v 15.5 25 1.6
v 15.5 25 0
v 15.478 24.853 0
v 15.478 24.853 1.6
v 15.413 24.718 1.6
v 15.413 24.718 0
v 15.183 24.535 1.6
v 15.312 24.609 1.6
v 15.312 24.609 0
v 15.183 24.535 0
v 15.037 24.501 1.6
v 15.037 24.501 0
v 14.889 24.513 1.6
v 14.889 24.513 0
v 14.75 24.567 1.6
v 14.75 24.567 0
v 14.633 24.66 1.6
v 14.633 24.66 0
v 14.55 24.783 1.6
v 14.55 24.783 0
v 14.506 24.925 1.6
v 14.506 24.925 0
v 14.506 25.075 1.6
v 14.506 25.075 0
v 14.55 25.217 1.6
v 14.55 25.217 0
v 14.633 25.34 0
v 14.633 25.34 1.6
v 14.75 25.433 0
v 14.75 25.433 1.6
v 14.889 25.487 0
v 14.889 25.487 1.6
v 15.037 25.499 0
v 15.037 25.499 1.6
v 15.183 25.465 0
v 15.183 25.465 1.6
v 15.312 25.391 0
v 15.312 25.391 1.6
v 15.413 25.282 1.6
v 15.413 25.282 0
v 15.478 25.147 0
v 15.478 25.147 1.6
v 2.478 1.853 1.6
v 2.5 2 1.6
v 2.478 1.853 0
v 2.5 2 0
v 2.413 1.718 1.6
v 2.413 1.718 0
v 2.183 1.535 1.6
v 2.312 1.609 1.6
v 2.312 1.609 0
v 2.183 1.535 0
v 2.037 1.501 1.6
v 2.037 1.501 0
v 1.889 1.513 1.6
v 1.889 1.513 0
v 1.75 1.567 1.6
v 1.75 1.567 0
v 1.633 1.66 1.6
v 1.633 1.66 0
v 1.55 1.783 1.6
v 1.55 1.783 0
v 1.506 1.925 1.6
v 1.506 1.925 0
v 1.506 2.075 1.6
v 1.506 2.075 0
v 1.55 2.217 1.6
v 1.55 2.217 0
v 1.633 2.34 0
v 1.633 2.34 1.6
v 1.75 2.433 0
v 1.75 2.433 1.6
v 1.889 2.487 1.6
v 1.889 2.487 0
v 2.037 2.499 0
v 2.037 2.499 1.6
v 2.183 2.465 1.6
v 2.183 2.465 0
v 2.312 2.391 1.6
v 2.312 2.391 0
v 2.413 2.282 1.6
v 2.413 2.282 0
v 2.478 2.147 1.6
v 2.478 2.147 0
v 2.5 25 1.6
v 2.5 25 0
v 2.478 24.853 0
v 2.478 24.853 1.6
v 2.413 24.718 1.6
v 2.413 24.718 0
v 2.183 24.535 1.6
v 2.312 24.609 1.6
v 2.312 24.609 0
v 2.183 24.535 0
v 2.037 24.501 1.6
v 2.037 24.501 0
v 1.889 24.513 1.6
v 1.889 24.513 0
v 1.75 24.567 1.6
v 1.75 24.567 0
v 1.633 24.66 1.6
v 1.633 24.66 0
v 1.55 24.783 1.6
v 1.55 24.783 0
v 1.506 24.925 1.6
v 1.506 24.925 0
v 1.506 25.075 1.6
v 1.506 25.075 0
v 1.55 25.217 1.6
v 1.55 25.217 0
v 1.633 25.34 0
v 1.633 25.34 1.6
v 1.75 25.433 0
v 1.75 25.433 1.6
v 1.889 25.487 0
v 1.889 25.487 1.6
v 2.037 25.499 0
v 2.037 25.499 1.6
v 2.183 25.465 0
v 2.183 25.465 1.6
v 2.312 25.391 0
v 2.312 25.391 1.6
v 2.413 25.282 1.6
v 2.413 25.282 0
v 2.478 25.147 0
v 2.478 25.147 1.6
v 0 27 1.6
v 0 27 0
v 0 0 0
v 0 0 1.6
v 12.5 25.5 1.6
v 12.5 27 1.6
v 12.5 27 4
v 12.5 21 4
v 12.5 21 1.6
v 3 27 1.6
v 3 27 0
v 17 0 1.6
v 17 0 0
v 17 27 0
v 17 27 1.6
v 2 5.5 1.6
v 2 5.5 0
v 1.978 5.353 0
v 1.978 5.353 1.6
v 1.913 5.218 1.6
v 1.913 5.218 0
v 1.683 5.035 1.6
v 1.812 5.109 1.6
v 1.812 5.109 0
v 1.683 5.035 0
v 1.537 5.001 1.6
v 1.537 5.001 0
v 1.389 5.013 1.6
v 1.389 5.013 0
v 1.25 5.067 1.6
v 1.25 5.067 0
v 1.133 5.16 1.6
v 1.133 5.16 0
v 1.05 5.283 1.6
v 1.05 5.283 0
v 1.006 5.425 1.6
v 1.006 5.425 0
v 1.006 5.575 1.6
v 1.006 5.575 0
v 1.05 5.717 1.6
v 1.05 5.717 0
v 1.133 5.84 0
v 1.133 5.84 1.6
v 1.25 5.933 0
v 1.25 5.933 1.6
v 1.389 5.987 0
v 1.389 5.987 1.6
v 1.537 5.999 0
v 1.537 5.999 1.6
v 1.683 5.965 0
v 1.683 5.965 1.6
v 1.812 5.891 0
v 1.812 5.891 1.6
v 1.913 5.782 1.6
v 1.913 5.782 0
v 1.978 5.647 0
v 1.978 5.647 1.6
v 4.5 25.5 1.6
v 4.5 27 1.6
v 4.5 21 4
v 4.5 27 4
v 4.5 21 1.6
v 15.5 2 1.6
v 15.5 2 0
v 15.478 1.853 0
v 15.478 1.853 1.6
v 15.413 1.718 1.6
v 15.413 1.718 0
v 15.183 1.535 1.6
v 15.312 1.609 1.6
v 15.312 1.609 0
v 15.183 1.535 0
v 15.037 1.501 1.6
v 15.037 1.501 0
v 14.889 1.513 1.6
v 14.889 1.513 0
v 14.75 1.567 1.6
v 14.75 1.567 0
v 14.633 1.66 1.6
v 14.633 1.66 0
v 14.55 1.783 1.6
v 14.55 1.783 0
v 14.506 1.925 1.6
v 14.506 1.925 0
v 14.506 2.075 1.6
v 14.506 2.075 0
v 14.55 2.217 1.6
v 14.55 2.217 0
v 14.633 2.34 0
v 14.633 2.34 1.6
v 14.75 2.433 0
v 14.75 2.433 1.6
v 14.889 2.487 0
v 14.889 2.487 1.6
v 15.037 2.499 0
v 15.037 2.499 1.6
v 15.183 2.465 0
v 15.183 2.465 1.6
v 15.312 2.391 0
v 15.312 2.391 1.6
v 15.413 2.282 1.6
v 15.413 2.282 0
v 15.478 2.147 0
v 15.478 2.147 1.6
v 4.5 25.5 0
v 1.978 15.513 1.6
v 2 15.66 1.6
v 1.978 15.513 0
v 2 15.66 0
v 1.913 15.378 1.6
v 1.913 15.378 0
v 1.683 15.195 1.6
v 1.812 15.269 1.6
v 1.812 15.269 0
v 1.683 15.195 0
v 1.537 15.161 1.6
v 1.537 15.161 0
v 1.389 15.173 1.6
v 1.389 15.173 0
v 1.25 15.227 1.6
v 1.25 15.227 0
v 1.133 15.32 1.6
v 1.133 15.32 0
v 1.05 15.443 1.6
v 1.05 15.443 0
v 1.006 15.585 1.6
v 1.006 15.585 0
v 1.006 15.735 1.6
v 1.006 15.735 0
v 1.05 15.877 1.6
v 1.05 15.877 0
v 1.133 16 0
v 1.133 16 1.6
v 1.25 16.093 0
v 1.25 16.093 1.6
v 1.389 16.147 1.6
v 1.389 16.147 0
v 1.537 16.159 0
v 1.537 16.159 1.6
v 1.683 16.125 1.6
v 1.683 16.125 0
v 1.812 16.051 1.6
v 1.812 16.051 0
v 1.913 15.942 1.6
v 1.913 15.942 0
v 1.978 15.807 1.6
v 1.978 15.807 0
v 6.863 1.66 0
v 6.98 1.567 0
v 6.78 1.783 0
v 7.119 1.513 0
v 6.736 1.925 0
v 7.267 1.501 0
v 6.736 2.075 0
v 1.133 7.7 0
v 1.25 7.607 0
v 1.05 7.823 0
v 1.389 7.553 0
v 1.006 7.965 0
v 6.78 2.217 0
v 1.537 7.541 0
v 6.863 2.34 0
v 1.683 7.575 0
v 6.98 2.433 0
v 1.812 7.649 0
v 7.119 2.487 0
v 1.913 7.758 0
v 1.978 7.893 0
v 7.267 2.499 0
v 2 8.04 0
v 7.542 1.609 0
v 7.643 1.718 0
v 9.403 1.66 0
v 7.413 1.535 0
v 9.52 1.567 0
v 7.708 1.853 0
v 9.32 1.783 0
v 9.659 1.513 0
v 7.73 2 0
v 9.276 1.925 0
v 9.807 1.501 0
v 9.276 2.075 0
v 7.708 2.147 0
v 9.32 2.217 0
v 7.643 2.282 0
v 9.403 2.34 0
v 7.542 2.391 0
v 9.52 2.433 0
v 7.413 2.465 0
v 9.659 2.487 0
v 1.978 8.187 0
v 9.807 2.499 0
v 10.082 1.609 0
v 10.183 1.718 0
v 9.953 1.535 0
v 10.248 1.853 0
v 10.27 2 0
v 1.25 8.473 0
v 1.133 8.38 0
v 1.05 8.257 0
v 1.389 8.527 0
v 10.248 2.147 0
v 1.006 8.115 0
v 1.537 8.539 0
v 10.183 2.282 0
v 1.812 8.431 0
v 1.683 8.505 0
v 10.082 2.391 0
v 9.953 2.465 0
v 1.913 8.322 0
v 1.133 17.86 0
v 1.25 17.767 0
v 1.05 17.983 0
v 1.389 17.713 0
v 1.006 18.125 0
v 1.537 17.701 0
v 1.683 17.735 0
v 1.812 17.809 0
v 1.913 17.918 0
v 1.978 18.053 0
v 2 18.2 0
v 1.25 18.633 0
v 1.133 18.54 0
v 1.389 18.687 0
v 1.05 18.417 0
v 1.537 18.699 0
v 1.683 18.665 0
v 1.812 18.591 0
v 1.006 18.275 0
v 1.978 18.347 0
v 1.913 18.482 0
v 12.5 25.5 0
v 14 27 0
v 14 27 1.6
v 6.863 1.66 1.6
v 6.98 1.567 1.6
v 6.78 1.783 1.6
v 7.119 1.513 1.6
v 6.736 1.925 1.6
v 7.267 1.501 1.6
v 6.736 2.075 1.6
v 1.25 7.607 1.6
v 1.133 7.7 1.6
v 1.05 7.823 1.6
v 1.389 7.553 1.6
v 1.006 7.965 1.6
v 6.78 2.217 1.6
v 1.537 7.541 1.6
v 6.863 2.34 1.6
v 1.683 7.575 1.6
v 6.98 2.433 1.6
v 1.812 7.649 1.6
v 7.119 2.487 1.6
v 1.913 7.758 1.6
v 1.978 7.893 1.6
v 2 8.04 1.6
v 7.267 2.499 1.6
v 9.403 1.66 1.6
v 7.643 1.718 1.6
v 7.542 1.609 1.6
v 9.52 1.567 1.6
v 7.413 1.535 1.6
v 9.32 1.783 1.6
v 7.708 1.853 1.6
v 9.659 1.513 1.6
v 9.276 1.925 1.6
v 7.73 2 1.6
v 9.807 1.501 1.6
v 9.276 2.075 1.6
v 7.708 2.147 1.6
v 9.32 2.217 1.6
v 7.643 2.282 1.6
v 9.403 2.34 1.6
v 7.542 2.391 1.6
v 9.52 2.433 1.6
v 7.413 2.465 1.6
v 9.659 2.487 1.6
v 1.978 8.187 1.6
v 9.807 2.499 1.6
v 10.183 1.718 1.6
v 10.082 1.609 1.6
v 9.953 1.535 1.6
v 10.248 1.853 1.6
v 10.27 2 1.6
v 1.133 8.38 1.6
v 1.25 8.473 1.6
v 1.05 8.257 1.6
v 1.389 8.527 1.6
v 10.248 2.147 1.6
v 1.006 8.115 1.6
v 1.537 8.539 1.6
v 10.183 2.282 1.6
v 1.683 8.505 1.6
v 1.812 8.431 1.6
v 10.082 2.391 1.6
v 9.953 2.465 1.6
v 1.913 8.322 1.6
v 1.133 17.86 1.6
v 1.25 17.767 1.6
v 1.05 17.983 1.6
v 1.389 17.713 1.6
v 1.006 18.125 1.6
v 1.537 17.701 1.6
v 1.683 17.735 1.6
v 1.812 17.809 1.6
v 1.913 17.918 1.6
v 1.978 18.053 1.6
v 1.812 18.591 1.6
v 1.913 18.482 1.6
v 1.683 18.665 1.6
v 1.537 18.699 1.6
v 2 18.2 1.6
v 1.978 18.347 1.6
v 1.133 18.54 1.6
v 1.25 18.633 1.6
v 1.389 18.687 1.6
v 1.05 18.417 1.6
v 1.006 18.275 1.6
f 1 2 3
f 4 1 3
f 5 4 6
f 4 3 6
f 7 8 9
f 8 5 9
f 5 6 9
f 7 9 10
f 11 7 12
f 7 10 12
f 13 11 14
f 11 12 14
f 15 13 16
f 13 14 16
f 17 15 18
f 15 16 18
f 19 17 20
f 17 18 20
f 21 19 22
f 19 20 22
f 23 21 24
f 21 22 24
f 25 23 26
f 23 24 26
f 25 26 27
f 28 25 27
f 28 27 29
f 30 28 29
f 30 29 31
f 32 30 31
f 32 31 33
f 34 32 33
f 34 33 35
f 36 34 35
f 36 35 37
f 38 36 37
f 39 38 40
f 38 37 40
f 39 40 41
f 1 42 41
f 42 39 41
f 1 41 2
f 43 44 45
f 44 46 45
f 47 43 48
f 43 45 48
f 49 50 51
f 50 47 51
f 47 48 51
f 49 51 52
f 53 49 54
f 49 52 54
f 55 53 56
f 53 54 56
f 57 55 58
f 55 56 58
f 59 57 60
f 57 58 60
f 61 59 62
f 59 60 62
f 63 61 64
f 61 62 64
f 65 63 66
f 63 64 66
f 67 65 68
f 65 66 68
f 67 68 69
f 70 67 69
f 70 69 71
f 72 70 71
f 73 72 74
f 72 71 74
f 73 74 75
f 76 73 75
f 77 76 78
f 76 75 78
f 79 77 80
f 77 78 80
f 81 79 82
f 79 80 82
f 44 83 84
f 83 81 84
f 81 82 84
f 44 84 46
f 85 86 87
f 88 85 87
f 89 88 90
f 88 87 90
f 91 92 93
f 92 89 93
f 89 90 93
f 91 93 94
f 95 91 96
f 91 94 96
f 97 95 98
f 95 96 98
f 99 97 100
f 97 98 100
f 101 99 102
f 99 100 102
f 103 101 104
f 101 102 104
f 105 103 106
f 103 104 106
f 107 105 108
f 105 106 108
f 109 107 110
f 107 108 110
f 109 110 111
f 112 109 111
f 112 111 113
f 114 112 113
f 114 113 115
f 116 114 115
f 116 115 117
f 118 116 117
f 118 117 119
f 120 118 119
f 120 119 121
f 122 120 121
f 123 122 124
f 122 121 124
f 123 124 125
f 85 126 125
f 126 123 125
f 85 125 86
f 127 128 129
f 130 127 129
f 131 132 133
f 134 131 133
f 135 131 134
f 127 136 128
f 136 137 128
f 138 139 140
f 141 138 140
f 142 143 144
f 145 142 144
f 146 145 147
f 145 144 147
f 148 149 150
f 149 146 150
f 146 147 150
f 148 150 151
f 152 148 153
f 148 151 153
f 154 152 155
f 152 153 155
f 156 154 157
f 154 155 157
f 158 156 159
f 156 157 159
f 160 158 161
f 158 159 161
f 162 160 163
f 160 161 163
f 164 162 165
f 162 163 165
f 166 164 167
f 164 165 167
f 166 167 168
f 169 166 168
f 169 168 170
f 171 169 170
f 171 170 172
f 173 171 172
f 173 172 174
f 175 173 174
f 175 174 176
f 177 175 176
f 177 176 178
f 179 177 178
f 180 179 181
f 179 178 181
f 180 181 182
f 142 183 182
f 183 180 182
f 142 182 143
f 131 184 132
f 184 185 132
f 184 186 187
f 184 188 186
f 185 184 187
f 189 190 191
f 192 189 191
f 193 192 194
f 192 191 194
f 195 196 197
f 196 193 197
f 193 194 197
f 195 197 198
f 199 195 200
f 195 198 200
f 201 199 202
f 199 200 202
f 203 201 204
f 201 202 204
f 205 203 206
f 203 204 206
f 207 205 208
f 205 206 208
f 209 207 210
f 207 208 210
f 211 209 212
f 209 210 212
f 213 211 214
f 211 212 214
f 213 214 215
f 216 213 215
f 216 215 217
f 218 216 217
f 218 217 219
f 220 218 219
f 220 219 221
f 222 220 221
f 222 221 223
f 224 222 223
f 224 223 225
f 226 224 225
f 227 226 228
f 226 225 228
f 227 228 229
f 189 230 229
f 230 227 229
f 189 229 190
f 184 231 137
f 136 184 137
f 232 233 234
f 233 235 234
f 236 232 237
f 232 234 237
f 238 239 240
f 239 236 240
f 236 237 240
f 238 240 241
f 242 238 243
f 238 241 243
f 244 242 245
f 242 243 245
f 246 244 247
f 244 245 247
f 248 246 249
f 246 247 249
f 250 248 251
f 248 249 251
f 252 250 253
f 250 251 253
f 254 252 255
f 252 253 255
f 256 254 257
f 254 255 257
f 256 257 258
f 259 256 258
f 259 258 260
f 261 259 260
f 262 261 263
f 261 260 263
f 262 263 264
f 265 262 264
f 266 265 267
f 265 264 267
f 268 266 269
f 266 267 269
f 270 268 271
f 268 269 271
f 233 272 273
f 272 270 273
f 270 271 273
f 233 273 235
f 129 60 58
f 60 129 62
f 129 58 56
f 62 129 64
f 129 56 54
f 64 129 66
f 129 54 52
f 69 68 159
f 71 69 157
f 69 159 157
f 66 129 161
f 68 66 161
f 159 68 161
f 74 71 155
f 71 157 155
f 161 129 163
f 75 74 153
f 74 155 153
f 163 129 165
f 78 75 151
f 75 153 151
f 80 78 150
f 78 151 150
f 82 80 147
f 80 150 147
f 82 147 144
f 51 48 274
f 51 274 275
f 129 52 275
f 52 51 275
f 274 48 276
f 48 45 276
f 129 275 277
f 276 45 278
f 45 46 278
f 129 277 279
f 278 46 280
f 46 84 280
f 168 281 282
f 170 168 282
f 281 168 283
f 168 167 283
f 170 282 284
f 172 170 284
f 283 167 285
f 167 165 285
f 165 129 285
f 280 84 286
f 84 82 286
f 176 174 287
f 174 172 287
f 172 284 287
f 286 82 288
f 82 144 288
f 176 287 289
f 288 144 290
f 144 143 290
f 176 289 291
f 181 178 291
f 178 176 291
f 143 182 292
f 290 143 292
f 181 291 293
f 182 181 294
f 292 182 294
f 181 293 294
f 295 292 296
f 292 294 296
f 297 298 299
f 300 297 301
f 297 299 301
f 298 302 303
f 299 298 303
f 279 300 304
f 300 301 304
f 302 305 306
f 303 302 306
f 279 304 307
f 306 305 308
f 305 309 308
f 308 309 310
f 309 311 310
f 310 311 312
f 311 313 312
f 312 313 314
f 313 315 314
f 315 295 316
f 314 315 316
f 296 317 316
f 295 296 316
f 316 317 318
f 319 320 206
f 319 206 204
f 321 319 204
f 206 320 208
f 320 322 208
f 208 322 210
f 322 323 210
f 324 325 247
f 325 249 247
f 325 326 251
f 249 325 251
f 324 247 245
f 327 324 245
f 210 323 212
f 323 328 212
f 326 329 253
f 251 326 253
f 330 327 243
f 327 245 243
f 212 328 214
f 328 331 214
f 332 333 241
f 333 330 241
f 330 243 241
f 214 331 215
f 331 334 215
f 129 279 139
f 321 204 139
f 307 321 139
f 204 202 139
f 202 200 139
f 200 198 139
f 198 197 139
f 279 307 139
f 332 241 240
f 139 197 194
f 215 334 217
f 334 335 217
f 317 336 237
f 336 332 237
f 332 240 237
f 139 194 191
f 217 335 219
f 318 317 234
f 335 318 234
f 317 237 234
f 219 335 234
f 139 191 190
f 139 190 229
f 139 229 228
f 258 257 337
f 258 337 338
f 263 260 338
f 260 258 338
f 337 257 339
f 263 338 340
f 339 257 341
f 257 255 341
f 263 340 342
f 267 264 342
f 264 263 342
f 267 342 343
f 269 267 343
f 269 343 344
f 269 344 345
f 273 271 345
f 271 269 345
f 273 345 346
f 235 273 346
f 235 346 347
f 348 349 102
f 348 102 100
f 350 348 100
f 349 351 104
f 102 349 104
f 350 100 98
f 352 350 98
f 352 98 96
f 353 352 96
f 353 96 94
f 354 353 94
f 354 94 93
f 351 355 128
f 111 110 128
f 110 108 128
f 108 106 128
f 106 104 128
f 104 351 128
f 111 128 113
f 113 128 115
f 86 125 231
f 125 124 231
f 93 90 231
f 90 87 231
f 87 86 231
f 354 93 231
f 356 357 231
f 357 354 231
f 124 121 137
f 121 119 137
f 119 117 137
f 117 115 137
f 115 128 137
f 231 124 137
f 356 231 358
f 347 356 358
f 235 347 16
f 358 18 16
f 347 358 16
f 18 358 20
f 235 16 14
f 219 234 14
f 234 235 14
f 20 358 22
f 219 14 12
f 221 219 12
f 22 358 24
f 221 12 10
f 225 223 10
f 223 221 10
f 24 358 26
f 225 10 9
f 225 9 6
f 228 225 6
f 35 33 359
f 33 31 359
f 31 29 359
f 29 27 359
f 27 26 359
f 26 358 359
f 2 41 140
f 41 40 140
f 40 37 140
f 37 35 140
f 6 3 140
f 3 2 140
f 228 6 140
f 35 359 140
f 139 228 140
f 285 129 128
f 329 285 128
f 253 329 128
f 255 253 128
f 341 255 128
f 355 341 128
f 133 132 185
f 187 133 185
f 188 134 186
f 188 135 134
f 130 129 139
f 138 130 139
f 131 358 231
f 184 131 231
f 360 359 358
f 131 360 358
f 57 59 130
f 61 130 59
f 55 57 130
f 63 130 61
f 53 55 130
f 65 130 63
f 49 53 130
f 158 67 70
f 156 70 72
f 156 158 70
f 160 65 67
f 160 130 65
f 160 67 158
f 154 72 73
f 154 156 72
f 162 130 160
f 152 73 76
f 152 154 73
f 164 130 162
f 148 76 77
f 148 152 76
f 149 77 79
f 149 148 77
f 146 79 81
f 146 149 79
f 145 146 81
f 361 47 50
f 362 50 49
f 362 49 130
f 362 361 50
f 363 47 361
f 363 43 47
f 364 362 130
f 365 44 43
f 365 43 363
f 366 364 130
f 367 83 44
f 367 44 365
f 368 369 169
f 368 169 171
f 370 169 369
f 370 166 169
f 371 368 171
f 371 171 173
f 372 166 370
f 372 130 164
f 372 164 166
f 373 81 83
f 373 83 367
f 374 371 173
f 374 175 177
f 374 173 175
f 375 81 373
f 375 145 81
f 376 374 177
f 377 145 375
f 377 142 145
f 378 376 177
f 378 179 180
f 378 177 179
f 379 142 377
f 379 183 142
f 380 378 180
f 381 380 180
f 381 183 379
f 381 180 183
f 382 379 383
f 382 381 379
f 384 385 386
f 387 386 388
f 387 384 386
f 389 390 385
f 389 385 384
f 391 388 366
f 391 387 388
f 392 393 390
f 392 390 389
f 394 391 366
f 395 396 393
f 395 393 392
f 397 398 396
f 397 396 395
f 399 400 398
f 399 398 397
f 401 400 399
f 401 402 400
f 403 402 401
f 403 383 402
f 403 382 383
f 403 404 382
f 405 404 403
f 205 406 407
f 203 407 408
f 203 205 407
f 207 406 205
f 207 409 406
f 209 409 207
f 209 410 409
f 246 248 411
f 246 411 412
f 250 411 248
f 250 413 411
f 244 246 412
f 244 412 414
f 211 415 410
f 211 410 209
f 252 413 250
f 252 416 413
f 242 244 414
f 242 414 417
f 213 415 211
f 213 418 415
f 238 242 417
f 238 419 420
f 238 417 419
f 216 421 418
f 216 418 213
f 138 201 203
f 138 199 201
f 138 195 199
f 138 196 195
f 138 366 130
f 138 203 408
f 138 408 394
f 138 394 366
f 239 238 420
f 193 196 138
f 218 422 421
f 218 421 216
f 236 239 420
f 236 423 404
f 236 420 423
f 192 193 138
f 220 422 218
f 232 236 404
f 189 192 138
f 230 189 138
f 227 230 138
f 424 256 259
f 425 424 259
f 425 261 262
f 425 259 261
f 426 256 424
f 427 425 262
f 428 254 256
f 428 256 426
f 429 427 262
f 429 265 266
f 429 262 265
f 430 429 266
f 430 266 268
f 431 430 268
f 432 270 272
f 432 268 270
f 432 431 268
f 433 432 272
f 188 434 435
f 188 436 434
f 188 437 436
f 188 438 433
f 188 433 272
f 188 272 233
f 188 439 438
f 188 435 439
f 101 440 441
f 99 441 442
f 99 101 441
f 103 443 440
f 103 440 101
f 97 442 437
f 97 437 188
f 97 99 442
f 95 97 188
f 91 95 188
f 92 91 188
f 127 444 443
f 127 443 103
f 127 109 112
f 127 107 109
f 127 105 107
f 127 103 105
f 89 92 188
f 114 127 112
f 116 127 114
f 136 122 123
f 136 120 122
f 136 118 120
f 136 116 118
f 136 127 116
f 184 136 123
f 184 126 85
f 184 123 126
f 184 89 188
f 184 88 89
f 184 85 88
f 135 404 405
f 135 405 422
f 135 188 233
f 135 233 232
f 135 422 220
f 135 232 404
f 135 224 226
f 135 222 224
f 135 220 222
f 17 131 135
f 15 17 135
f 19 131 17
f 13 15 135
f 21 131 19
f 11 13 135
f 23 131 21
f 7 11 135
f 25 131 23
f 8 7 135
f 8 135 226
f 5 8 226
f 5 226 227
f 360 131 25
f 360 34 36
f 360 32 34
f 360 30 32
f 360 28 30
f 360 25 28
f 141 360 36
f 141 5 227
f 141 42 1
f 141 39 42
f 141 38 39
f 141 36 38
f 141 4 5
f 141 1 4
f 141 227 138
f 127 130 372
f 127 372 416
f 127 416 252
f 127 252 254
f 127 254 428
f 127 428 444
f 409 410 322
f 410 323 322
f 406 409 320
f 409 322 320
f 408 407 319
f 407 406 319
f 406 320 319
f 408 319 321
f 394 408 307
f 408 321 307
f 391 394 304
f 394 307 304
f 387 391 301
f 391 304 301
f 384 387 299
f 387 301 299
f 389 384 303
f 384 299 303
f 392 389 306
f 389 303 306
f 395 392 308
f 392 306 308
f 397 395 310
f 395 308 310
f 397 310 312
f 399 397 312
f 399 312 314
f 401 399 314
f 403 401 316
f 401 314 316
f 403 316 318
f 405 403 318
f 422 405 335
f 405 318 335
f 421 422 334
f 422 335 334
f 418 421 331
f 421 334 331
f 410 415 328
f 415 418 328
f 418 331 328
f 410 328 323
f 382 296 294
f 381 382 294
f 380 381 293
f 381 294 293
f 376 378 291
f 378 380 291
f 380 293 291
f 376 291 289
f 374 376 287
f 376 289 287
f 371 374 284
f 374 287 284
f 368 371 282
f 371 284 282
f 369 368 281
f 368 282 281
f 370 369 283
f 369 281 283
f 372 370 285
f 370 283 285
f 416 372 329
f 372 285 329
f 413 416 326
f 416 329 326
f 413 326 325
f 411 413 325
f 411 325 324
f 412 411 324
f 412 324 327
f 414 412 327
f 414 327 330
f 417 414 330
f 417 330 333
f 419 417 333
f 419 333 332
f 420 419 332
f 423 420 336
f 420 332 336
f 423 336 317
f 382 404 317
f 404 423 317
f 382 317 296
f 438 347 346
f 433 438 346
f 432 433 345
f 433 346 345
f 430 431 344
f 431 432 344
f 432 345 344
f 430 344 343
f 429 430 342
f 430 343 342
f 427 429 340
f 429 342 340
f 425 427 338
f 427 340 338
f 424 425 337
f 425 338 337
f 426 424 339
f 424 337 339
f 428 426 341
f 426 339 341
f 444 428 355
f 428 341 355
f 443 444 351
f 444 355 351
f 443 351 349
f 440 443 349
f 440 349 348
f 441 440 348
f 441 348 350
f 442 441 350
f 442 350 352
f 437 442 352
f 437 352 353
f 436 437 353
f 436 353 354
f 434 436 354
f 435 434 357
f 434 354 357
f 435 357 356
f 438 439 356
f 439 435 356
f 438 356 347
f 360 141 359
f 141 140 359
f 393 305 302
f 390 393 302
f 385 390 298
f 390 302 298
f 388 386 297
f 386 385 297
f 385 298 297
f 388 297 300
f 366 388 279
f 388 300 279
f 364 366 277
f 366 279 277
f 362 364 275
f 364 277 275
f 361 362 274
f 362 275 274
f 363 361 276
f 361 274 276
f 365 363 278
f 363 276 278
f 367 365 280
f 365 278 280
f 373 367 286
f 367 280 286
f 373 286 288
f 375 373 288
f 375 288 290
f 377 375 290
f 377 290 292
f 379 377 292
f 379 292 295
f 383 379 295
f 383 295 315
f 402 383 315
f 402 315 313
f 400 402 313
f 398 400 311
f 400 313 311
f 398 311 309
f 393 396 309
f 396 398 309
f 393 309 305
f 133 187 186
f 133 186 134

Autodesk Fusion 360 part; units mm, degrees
sketch "Skizze1" plane through (0, 0, 0) normal (0, 0, 1) x (1, 0, 0)
  line L0 (0, 0) -> (17, 0)
  line L1 (17, 0) -> (17, 27)
  line L2 (17, 27) -> (0, 27)
  line L3 (0, 27) -> (0, 0)
  line L4 (14, 27) -> (12.5, 25.5)
  line L5 (12.5, 25.5) -> (4.5, 25.5)
  line L6 (4.5, 25.5) -> (3, 27)
  line L7 (4.5, 27) -> (12.5, 27)
  line L8 (12.5, 27) -> (12.5, 21)
  line L9 (12.5, 21) -> (4.5, 21)
  line L10 (4.5, 21) -> (4.5, 27)
  circle A0 centre (2, 25) radius 0.5
  circle A1 centre (15, 25) radius 0.5
  circle A2 centre (2, 2) radius 0.5
  circle A3 centre (15, 2) radius 0.5
  circle A4 centre (7.23, 2) radius 0.5
  circle A5 centre (9.77, 2) radius 0.5
  line L11 (8.5, 0) -> (8.5, 3.6203)
  circle A6 centre (1.5, 5.5) radius 0.5
  circle A7 centre (1.5, 8.04) radius 0.5
  circle A8 centre (1.5, 15.66) radius 0.5
  circle A9 centre (1.5, 18.2) radius 0.5
  dimension "d1" = 17
  dimension "d2" = 27
  dimension "d3" = 3
  dimension "d4" = 3
  dimension "d5" = 45
  dimension "d6" = 45
  dimension "d7" = 1.5
  dimension "d8" = 8
  dimension "d9" = 6
  dimension "d10" = 4.5
  dimension "d17" = 1
  dimension "d18" = 2
  dimension "d19" = 2
  dimension "d22" = 13
  dimension "d23" = -23
  dimension "d24" = 1
  dimension "d25" = 2
  dimension "d28" = 2.54
  dimension "d29" = 0
  dimension "d30" = 1
  dimension "d31" = 5.5
  dimension "d32" = 1.5
  dimension "d35" = 0
  dimension "d36" = 2.54
  dimension "d39" = 0
  dimension "d40" = 10.16
extrude "Extrusion2" add sketch "Skizze1" along normal blind 4 contours L2 L5 L7 L8 L10 | L5 L8 L9 L10
extrude "Extrusion3" cut sketch "Skizze1" along normal blind 1.6 contours L2 L5 L7 L8 L10
extrude "Extrusion4" add sketch "Skizze1" along normal blind 1.6 contours L0 L1 L2 L3 L4 L6 L8 L9 L10
sketch "Skizze2" plane through (0, 0, 1.6) normal (0, 0, 1) x (-1, 0, 0)
  circle A0 centre (-1.5, -15.66) radius 0.5
  circle A1 centre (-2, -2) radius 0.5
  circle A2 centre (-1.5, -8.04) radius 0.5
  circle A3 centre (-15, -25) radius 0.5
  circle A4 centre (-1.5, -18.2) radius 0.5
  circle A5 centre (-7.23, -2) radius 0.5
  circle A6 centre (-1.5, -5.5) radius 0.5
  circle A7 centre (-15, -2) radius 0.5
  circle A8 centre (-9.77, -2) radius 0.5
  circle A9 centre (-2, -25) radius 0.5
  line L0 (-4.5, -21) -> (-4.5, -25.5)
  line L1 (-4.5, -25.5) -> (-3, -27)
  line L2 (-3, -27) -> (0, -27)
  line L3 (0, -27) -> (0, 0)
  line L4 (0, 0) -> (-17, 0)
  line L5 (-17, 0) -> (-17, -27)
  line L6 (-17, -27) -> (-14, -27)
  line L7 (-14, -27) -> (-12.5, -25.5)
  line L8 (-12.5, -25.5) -> (-12.5, -21)
  line L9 (-12.5, -21) -> (-4.5, -21)
  line L10 (-4.75, -3.5) -> (-12.25, -3.5)
  line L11 (-12.25, -3.5) -> (-12.25, 7.5)
  line L12 (-12.25, 7.5) -> (-4.75, 7.5)
  line L13 (-4.75, 7.5) -> (-4.75, -3.5)
  line L14 (-4.75, 0) -> (-12.25, 0)
  line L15 (0, 0) -> (-17, 0)
  dimension "d43" = 7.5
  dimension "d44" = 11
  dimension "d45" = 3.5
extrude "Extrusion5" [suppressed]
